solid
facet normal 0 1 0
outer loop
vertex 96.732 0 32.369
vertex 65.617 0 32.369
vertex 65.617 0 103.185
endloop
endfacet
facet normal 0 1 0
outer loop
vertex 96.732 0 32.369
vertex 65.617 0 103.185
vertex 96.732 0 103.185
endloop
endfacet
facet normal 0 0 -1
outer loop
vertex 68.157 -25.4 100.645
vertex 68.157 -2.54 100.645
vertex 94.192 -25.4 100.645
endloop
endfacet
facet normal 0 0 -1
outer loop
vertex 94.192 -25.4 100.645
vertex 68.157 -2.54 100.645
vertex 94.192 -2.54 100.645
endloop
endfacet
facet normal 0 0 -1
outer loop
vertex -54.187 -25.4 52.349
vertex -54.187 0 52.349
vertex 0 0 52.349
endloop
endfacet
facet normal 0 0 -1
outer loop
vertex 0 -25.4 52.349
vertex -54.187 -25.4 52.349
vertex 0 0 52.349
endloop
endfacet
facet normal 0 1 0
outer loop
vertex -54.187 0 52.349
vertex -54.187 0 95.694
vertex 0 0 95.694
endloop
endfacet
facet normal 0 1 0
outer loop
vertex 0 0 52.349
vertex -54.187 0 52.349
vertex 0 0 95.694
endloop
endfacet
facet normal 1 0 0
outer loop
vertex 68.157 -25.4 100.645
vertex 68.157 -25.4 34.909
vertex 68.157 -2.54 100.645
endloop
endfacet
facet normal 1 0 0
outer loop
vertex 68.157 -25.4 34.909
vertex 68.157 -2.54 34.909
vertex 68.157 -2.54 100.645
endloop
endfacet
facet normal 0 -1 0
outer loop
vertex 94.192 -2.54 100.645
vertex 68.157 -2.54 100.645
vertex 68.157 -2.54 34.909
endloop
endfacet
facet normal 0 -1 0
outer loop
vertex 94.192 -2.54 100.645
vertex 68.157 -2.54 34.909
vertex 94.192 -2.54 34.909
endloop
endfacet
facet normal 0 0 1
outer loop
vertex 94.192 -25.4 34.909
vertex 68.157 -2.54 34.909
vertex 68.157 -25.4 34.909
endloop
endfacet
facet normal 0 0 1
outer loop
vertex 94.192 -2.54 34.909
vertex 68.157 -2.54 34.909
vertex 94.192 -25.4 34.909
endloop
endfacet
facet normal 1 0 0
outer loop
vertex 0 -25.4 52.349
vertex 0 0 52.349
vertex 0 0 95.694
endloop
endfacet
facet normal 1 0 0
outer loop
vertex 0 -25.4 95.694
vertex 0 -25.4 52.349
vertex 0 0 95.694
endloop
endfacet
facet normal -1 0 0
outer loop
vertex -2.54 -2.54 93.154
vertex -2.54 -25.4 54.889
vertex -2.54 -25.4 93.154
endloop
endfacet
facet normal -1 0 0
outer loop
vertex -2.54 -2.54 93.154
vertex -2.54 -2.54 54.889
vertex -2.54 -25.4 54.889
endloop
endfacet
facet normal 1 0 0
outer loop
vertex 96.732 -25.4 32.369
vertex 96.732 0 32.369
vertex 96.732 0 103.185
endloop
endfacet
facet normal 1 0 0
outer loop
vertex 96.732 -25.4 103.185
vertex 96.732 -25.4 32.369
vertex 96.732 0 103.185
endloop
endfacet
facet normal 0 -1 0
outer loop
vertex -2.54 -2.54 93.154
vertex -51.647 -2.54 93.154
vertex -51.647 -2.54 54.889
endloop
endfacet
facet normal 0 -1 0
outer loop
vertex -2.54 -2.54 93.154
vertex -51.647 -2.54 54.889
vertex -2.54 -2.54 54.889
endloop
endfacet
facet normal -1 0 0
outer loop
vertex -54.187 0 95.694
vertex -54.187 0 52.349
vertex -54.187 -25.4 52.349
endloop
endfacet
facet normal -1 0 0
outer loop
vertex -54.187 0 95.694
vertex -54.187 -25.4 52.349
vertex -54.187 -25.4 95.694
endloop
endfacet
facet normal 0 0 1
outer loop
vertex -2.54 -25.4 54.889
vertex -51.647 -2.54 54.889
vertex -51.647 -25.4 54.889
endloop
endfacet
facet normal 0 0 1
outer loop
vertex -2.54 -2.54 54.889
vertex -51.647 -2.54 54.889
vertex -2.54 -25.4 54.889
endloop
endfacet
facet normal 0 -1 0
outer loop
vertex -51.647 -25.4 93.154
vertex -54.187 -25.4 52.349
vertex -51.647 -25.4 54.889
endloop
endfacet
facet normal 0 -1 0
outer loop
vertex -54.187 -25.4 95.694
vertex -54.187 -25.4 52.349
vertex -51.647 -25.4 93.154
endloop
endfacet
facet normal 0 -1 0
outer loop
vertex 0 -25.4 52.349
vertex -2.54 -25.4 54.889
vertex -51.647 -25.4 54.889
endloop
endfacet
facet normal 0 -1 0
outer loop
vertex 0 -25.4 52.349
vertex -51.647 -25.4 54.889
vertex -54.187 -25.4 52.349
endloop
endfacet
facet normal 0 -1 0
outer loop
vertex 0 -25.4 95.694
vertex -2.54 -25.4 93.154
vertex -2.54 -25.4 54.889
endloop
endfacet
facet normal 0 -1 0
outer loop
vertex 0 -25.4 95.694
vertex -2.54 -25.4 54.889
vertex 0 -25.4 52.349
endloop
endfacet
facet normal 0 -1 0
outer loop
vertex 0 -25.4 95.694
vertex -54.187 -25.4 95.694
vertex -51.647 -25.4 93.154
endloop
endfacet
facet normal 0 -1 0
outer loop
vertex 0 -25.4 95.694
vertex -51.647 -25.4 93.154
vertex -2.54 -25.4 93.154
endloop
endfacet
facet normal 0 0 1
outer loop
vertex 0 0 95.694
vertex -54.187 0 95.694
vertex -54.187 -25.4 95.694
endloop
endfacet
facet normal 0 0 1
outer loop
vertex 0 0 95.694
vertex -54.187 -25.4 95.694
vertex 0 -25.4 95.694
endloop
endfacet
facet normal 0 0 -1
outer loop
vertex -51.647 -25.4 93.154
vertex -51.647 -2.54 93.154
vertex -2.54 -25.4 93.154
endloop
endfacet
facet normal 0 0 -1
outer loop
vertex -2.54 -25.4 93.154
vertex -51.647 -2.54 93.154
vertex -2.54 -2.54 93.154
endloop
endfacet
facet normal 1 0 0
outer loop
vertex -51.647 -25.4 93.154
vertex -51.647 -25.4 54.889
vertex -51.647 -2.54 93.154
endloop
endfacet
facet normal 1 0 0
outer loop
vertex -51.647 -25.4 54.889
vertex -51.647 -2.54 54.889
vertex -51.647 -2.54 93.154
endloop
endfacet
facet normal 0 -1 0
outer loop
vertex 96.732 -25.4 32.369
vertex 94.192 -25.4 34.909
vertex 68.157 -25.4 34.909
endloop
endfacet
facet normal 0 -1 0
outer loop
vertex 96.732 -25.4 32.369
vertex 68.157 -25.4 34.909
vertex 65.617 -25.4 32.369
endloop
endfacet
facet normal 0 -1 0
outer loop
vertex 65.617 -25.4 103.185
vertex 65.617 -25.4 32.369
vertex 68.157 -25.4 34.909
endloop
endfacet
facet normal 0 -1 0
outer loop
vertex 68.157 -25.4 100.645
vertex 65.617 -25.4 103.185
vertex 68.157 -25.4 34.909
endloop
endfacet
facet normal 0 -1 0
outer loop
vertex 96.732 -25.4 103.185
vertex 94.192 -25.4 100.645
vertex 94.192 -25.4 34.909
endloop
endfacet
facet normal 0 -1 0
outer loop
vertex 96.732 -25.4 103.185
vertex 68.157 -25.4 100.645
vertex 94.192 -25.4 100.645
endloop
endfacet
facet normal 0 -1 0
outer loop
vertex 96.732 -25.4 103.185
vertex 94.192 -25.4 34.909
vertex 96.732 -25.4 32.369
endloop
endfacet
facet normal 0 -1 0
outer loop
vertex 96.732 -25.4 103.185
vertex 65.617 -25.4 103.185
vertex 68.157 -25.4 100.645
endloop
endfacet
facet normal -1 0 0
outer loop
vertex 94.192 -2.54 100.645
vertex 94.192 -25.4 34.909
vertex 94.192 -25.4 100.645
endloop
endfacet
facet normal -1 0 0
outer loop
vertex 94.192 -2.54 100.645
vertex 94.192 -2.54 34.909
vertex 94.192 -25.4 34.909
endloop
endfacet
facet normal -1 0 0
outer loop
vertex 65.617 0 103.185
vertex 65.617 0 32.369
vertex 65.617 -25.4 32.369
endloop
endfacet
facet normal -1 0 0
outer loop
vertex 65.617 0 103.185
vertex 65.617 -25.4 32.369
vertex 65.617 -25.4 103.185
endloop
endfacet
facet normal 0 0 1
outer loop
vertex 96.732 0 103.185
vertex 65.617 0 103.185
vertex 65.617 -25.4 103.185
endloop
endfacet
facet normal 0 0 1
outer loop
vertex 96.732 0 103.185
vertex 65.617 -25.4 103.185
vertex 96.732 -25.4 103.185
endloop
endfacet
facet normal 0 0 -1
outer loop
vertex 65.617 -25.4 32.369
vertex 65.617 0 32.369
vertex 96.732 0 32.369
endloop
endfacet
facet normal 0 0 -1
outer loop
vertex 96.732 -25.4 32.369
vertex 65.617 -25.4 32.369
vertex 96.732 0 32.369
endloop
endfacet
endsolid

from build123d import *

# Parameters (mm, degrees)
F0_W     = 54.1866458952
F0_H     = 43.34513098
F1_DEPTH = 25.4
F0_W_2   = 31.114988029
F0_H_2   = 70.8162225783
F2_T     = -2.54
F3_T     = -2.54


with BuildPart() as f1:
    # F0 (on Front) → F1 (new body)
    with BuildSketch(Plane.XZ):
        with Locations((-27.0933229476, 74.0217454731)):
            Rectangle(F0_W, F0_H)
    extrude(amount=F1_DEPTH)

    # F2
    f2_openings = [f1.faces().sort_by_distance(p)[0] for p in [
        (-27.093323, -25.4, 74.021745),
    ]]
    offset(amount=F2_T, openings=f2_openings)


with BuildPart() as f1b:
    # F0 (on Front) → F1, piece 2 (new body)
    with BuildSketch(Plane.XZ):
        with Locations((81.1741761863, 67.7771102637)):
            Rectangle(F0_W_2, F0_H_2)
    extrude(amount=F1_DEPTH)

    # F3
    f3_openings = [f1b.faces().sort_by_distance(p)[0] for p in [
        (81.174176, -25.4, 67.77711),
    ]]
    offset(amount=F3_T, openings=f3_openings)


solid = Compound([f1.part, f1b.part])
